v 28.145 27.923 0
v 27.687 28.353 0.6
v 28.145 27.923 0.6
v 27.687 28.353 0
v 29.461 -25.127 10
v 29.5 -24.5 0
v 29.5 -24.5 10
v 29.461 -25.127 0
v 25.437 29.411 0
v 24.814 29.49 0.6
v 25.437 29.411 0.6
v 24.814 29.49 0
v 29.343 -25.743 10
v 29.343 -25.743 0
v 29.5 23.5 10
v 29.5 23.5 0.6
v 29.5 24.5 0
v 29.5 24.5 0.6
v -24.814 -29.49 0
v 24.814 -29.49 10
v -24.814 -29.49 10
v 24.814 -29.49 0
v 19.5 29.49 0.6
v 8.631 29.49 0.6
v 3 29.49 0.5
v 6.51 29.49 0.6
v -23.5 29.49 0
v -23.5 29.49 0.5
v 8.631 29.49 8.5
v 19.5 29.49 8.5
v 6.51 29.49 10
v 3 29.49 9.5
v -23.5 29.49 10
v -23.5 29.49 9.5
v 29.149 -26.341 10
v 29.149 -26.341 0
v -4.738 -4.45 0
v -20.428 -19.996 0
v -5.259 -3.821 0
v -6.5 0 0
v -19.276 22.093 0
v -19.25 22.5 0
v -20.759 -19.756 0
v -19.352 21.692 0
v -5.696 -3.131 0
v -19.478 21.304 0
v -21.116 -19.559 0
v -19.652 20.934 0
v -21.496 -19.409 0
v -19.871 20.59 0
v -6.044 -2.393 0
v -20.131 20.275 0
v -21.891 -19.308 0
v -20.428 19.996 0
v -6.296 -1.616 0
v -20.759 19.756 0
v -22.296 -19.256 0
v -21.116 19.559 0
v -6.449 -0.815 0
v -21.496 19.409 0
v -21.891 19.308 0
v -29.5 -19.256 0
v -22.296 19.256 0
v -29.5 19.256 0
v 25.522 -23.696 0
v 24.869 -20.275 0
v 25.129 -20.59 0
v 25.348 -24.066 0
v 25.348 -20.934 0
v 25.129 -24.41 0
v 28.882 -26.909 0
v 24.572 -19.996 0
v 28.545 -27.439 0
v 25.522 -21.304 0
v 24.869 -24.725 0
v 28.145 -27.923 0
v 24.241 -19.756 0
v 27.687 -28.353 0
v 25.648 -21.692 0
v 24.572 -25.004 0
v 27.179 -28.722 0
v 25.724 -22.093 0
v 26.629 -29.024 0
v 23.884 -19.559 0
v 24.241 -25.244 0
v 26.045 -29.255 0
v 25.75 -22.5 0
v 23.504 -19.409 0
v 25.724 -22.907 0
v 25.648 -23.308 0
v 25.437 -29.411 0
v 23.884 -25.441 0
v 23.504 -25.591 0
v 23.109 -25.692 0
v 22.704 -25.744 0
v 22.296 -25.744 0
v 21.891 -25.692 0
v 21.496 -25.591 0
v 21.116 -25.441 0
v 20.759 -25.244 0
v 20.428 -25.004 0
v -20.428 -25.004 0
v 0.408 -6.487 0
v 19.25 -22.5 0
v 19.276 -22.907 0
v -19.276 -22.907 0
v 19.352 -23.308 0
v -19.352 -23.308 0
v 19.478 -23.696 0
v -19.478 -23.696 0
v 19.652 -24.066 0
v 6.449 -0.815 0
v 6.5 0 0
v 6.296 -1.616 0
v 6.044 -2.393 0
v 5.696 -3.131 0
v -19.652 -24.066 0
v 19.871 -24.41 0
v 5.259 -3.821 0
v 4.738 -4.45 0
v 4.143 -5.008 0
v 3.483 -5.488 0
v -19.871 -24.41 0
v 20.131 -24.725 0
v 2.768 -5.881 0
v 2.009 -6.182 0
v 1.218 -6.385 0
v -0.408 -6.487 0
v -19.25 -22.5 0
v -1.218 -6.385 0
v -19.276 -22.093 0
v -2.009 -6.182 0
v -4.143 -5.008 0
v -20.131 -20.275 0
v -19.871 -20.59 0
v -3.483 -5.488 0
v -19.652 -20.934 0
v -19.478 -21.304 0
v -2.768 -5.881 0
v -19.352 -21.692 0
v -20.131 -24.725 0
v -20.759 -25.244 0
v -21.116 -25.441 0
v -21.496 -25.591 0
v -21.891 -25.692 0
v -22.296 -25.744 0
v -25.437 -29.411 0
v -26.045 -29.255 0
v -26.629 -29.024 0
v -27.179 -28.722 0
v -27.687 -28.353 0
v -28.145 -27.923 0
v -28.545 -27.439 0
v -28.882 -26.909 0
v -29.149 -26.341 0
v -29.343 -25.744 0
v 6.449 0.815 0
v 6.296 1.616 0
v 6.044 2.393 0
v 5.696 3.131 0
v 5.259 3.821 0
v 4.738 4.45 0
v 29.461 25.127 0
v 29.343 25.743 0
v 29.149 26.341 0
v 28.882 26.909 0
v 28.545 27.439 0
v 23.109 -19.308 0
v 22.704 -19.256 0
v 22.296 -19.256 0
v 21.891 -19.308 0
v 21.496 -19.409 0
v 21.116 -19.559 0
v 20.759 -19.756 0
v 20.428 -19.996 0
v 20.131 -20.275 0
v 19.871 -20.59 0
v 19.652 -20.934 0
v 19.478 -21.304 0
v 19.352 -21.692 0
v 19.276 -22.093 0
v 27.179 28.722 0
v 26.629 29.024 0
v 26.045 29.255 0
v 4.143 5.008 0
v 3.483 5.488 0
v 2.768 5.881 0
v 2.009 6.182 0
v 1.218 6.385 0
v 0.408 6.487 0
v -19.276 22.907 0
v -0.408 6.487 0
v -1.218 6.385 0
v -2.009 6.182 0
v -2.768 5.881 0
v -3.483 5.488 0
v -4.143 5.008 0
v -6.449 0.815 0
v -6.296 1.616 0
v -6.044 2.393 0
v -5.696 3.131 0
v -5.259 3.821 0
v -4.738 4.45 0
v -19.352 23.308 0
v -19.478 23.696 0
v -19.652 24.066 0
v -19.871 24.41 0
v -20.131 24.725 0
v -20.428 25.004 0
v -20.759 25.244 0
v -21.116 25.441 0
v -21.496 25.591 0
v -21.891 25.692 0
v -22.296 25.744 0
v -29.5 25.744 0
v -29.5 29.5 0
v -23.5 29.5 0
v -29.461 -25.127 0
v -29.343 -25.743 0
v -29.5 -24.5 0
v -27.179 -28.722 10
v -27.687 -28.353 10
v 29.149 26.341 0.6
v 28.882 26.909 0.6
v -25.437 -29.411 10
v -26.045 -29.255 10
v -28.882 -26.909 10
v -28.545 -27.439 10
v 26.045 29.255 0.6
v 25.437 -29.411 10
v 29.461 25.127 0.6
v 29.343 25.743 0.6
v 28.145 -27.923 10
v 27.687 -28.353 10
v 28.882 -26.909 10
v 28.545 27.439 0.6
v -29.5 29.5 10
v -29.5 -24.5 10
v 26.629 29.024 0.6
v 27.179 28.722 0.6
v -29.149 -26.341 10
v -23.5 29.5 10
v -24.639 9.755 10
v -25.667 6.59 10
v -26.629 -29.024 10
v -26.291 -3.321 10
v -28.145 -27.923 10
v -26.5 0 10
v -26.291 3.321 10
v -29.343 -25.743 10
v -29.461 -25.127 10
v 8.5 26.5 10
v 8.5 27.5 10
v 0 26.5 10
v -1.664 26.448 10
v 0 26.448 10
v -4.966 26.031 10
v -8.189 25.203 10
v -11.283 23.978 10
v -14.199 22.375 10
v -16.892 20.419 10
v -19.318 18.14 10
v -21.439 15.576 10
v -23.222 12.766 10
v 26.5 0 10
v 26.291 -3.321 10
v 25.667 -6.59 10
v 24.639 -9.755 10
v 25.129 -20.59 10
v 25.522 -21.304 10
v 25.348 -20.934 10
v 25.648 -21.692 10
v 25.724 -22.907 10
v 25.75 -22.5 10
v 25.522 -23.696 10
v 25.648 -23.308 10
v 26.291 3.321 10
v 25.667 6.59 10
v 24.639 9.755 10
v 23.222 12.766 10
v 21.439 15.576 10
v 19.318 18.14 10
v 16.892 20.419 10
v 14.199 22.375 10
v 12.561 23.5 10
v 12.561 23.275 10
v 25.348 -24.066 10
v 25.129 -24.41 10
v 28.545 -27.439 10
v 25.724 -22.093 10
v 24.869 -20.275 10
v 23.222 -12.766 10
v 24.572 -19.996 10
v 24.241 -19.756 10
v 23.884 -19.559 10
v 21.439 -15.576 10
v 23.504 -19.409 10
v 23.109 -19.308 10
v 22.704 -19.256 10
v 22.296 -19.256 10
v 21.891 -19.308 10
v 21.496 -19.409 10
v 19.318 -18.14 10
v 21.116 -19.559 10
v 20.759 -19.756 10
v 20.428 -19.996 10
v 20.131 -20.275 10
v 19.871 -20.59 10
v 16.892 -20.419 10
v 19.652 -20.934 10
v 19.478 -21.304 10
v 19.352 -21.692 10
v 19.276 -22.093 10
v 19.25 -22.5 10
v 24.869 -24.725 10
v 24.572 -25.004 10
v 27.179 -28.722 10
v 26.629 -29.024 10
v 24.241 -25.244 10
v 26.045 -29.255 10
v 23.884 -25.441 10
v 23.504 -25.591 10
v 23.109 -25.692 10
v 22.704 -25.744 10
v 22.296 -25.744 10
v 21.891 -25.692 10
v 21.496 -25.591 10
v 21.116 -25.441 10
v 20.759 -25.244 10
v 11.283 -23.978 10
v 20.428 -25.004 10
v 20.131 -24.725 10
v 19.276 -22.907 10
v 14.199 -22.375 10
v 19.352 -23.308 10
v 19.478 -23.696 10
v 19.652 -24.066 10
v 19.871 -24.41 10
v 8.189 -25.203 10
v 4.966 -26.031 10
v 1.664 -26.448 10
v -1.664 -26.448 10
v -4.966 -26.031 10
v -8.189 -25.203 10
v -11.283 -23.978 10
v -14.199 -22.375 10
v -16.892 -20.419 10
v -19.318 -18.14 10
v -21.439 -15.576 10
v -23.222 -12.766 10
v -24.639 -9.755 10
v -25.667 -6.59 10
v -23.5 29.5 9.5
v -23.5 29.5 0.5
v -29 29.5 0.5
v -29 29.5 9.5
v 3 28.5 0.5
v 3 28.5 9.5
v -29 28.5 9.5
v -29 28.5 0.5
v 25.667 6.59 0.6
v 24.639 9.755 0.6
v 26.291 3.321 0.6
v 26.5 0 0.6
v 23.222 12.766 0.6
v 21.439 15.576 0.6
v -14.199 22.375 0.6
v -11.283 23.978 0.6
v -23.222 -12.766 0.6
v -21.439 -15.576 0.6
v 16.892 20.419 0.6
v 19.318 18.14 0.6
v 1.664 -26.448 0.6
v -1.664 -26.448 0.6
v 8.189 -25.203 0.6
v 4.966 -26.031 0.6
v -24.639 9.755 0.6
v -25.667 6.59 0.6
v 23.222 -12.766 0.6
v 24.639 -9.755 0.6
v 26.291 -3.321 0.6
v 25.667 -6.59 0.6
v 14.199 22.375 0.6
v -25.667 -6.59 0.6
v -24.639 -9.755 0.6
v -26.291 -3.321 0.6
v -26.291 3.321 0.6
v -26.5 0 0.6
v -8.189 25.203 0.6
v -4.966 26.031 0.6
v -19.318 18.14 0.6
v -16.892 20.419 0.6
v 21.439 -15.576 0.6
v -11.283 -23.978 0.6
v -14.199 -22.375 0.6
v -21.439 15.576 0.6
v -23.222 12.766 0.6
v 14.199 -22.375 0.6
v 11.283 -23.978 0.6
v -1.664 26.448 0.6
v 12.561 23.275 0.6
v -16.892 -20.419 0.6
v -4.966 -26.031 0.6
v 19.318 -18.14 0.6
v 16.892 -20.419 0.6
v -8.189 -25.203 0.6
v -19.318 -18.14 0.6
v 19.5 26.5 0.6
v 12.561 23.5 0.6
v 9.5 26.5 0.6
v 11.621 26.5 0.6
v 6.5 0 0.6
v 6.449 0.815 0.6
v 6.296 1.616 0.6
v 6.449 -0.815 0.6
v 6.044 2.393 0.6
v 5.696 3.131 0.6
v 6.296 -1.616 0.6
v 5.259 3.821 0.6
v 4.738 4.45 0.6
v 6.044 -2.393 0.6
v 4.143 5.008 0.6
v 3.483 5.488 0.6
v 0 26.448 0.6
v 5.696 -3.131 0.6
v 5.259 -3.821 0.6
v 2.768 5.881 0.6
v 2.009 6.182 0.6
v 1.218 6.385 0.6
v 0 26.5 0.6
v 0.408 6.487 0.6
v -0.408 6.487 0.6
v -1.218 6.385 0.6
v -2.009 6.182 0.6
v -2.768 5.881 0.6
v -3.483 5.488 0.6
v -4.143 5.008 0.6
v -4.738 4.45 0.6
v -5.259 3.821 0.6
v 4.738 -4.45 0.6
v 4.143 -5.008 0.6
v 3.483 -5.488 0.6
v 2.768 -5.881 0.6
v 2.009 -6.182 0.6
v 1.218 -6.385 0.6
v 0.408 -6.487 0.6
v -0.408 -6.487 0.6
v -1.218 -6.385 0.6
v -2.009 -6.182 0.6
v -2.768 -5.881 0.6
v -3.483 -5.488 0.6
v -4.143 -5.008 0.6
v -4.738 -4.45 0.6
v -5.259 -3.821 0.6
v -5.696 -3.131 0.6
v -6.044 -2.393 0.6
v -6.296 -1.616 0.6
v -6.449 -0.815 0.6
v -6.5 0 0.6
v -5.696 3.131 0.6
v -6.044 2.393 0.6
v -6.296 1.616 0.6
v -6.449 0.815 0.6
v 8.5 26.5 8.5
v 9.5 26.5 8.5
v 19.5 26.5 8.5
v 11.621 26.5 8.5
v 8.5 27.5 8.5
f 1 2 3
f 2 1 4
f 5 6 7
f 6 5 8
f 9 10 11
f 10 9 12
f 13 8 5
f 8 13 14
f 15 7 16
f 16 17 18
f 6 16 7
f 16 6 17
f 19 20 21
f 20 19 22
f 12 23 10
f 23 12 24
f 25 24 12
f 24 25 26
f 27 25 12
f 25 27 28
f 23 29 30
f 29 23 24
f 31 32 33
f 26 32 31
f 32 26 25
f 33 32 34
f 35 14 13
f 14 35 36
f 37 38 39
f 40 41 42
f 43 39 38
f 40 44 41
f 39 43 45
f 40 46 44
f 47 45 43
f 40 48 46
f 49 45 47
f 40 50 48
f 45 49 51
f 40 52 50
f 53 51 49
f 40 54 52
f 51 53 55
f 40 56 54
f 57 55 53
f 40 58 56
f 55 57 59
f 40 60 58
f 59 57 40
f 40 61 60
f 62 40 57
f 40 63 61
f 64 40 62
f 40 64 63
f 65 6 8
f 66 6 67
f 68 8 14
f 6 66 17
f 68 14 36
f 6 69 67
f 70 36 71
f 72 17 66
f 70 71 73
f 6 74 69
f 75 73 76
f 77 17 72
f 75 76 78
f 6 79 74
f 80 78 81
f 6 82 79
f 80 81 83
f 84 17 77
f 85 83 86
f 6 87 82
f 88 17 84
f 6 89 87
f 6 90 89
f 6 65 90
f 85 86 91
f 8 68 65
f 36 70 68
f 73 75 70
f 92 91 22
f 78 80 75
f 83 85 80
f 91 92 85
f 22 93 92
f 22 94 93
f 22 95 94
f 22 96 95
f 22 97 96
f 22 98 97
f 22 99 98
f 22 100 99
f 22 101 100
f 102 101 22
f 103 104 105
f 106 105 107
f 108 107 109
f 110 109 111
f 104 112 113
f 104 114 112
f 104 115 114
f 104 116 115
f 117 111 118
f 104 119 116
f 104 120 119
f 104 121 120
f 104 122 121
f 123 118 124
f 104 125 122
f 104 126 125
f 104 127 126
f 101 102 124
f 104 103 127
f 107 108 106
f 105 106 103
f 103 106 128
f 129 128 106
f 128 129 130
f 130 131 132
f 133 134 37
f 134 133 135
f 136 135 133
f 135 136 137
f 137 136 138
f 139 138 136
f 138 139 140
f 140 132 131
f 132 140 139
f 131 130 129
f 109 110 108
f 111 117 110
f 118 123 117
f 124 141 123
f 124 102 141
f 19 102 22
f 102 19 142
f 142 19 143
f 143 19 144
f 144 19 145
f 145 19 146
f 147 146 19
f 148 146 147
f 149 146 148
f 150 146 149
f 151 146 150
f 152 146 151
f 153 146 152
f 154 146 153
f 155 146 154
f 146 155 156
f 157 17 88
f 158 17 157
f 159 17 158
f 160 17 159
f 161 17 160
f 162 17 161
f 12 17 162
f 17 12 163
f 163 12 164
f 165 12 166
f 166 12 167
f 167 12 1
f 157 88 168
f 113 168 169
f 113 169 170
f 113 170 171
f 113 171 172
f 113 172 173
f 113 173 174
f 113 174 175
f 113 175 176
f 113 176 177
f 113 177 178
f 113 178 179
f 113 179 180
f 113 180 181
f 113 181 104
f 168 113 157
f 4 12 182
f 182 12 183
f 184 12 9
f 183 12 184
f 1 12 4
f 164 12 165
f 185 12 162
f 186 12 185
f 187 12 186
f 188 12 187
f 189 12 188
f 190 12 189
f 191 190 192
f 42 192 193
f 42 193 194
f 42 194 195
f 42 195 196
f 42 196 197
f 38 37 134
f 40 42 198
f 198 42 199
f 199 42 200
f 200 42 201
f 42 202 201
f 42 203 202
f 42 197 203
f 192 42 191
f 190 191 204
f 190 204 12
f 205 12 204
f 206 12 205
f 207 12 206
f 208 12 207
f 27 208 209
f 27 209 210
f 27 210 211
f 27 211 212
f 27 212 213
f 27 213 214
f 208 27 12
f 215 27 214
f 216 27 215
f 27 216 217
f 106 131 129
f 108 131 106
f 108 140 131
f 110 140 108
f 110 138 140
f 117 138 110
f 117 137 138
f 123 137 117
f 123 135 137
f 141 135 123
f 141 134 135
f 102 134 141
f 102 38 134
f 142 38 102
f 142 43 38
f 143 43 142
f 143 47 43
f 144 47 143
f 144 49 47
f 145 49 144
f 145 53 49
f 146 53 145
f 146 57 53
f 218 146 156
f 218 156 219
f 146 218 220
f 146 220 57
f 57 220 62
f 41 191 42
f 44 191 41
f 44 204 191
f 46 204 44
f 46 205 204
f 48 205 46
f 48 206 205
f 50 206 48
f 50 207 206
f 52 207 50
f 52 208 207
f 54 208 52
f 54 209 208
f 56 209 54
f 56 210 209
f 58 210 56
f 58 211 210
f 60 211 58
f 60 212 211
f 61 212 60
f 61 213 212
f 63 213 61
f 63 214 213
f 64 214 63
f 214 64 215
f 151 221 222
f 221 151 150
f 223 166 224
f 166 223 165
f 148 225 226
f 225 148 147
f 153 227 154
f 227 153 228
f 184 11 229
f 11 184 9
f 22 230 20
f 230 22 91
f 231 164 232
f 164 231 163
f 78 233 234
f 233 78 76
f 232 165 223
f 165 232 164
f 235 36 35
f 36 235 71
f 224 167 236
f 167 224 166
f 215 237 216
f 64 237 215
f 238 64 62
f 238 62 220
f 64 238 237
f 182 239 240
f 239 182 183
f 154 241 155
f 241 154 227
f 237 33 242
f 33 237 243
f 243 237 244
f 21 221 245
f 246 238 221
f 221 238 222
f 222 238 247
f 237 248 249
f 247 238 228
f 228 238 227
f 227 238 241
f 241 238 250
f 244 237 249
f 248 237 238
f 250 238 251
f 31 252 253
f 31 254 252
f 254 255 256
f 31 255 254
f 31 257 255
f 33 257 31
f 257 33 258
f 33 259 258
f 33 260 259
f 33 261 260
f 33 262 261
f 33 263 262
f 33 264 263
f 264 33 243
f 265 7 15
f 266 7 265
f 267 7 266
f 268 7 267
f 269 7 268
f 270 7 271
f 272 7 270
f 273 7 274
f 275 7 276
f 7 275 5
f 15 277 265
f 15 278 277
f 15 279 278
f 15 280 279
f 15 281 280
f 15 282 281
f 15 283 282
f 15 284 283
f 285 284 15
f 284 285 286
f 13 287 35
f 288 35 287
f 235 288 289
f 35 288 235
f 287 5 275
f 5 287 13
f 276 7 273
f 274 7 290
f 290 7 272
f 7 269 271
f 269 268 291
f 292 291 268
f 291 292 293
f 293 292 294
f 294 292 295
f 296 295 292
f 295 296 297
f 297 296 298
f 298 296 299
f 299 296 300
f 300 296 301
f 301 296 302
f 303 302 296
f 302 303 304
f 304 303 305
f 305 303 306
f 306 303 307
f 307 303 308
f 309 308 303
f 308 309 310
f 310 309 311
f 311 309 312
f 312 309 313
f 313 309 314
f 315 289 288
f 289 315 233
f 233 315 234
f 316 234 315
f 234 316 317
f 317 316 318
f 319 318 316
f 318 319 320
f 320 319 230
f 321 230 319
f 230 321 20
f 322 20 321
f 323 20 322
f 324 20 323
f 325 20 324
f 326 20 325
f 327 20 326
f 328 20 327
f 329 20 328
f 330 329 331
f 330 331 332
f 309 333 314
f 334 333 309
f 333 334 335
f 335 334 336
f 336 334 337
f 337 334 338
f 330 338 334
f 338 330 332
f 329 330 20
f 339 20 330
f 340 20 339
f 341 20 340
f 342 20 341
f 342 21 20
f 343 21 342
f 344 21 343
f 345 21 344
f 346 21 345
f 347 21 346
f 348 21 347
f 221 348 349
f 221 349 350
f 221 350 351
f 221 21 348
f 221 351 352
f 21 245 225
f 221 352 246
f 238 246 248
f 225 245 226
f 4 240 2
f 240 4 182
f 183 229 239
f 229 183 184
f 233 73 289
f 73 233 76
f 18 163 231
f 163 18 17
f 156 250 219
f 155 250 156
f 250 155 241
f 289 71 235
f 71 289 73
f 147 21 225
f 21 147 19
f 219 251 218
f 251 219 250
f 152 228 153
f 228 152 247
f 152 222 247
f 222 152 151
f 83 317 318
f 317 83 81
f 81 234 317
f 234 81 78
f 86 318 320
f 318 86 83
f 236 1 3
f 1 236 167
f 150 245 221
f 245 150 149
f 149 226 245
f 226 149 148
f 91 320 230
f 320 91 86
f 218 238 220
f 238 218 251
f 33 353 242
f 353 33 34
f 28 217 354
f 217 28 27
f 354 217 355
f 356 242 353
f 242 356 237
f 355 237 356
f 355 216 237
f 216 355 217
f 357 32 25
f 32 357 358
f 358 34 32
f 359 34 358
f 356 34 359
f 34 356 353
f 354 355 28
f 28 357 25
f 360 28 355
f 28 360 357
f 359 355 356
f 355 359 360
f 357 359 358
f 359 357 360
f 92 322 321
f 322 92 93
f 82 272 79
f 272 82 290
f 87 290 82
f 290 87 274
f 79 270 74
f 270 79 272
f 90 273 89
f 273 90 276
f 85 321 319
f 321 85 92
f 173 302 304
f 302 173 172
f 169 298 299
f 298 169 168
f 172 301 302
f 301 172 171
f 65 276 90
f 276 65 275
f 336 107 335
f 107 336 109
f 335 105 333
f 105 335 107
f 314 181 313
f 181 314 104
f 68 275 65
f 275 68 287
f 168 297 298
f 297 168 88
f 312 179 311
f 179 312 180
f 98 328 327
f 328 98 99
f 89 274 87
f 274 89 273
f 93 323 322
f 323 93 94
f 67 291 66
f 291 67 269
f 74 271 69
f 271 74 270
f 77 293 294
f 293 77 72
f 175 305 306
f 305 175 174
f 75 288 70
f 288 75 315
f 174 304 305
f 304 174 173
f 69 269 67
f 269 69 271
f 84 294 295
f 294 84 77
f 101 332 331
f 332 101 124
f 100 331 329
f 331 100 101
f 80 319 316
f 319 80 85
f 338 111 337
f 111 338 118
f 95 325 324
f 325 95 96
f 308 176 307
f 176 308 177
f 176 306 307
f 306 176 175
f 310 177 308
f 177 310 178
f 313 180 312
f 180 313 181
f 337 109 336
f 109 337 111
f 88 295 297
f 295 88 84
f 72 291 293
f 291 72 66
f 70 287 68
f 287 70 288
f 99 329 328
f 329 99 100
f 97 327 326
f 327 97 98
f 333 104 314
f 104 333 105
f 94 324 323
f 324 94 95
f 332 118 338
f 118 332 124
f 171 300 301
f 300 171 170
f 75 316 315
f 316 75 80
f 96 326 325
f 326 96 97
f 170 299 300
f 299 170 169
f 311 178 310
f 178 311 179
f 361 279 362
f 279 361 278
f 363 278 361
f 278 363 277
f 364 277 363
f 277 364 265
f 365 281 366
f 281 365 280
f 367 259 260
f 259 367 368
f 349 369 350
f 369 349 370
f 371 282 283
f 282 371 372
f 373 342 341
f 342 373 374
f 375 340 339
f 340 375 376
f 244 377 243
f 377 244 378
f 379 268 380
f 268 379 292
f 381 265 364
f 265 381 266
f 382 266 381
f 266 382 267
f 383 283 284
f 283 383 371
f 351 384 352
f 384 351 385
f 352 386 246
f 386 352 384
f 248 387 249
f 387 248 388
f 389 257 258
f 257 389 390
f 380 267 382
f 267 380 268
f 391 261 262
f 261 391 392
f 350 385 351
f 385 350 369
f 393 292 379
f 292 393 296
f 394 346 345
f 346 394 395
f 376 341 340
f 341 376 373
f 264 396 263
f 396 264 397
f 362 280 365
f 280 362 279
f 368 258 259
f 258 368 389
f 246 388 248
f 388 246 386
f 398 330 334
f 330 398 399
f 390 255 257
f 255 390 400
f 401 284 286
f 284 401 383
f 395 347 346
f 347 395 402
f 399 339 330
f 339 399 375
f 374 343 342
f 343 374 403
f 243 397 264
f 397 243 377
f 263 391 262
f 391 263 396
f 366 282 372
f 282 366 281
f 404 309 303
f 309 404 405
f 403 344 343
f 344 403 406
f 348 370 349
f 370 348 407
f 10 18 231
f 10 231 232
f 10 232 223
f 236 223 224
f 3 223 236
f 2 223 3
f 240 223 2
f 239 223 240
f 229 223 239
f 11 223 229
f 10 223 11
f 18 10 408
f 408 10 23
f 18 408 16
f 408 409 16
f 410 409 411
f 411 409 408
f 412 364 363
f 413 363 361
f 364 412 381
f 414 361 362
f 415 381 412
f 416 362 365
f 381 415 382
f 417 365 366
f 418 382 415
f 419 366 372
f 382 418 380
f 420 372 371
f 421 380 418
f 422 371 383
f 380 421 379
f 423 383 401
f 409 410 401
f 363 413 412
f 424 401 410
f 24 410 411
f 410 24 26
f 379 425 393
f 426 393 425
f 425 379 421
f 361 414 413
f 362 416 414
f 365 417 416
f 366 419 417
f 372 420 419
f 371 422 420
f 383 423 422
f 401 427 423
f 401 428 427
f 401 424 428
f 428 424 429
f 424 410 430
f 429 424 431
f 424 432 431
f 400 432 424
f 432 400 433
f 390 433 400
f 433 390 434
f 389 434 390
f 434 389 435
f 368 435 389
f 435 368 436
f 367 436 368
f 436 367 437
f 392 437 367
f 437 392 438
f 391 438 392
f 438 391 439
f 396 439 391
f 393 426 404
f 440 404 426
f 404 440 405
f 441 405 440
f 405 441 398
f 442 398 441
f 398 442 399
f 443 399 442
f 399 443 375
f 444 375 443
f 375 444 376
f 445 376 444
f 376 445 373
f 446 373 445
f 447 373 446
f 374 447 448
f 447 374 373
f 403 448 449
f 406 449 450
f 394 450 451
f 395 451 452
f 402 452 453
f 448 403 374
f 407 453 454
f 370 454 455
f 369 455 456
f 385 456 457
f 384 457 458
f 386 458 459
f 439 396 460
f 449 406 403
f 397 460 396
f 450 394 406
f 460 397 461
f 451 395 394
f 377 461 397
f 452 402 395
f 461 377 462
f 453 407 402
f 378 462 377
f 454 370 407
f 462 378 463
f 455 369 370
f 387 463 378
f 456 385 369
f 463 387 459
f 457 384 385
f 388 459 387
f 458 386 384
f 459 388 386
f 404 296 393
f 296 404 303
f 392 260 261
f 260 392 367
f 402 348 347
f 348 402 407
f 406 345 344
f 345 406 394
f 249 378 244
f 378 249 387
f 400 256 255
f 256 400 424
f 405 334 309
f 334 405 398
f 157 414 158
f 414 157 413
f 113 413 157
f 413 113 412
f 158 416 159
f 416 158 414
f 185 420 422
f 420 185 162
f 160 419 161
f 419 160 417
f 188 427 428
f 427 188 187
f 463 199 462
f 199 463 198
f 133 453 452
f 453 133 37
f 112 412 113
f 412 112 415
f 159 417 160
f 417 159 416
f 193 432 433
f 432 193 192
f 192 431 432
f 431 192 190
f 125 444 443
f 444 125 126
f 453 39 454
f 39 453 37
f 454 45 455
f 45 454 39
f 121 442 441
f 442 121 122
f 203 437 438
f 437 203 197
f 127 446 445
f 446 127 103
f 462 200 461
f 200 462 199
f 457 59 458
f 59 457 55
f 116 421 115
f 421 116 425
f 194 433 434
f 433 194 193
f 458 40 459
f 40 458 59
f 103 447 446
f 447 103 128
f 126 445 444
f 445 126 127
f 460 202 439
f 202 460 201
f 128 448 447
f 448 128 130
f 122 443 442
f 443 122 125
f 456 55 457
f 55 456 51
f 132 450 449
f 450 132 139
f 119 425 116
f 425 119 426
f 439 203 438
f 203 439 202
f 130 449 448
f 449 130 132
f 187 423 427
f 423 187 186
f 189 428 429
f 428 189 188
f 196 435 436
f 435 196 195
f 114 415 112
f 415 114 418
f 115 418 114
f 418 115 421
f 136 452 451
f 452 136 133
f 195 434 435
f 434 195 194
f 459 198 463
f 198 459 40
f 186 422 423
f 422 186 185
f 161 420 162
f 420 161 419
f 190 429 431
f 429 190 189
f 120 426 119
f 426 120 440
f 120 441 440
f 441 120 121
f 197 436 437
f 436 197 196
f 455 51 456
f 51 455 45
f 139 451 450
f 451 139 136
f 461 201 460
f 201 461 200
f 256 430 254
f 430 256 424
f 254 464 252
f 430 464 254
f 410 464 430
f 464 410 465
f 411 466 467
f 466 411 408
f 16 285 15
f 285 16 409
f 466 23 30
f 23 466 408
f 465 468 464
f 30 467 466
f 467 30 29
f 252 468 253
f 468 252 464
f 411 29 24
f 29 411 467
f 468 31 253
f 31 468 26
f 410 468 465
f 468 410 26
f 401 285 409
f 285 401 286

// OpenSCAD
$fn = 50;


difference() {
	union() {
		hull() {
			translate(v = [-24.5000000000, 24.5000000000, 0]) {
				cylinder(h = 10, r = 5);
			}
			translate(v = [24.5000000000, 24.5000000000, 0]) {
				cylinder(h = 10, r = 5);
			}
			translate(v = [-24.5000000000, -24.5000000000, 0]) {
				cylinder(h = 10, r = 5);
			}
			translate(v = [24.5000000000, -24.5000000000, 0]) {
				cylinder(h = 10, r = 5);
			}
		}
		translate(v = [-29.5000000000, 23.5000000000, 0]) {
			cube(size = [6, 6, 10]);
		}
	}
	union() {
		translate(v = [-30.0000000000, -22.5000000000, -250.0000000000]) {
			rotate(a = [0, 0, 0]) {
				difference() {
					union() {
						hull() {
							translate(v = [7.5000000000, 0, 0]) {
								cylinder(h = 250, r = 3.2500000000, r1 = 3.2500000000, r2 = 3.2500000000);
							}
							translate(v = [-7.5000000000, 0, 0]) {
								cylinder(h = 250, r = 3.2500000000, r1 = 3.2500000000, r2 = 3.2500000000);
							}
						}
					}
					union();
				}
			}
		}
		translate(v = [-30.0000000000, 22.5000000000, -250.0000000000]) {
			rotate(a = [0, 0, 0]) {
				difference() {
					union() {
						hull() {
							translate(v = [7.5000000000, 0, 0]) {
								cylinder(h = 250, r = 3.2500000000, r1 = 3.2500000000, r2 = 3.2500000000);
							}
							translate(v = [-7.5000000000, 0, 0]) {
								cylinder(h = 250, r = 3.2500000000, r1 = 3.2500000000, r2 = 3.2500000000);
							}
						}
					}
					union();
				}
			}
		}
		translate(v = [-29.0000000000, 28.5000000000, 0.5000000000]) {
			cube(size = [32, 1, 9.0000000000]);
		}
		translate(v = [22.5000000000, -22.5000000000, -50.0000000000]) {
			cylinder(h = 100, r = 3.2500000000);
		}
		translate(v = [0, 0, 0.6000000000]) {
			cylinder(h = 12.4000000000, r = 26.5000000000);
		}
		translate(v = [0, 0, -5.0000000000]) {
			cylinder(h = 10, r = 6.5000000000);
		}
		translate(v = [0.0000000000, 23.5000000000, 0.6000000000]) {
			cube(size = [29.5000000000, 3, 12.4000000000]);
		}
		translate(v = [19.5000000000, 23.5000000000, 0.6000000000]) {
			cube(size = [10, 6, 12.4000000000]);
		}
		translate(v = [8.5000000000, 23.5000000000, 8.5000000000]) {
			cube(size = [21, 6, 1.5000000000]);
		}
		translate(v = [5.7500000000, 30.2500000000, 0.6000000000]) {
			rotate(a = [0, 0, -45]) {
				cube(size = [7.5000000000, 1.5000000000, 12.4000000000]);
			}
		}
		translate(v = [5.0610000000, 21.5000000000, 0.6000000000]) {
			cube(size = [7.5000000000, 2, 9.4000000000]);
		}
	}
}
